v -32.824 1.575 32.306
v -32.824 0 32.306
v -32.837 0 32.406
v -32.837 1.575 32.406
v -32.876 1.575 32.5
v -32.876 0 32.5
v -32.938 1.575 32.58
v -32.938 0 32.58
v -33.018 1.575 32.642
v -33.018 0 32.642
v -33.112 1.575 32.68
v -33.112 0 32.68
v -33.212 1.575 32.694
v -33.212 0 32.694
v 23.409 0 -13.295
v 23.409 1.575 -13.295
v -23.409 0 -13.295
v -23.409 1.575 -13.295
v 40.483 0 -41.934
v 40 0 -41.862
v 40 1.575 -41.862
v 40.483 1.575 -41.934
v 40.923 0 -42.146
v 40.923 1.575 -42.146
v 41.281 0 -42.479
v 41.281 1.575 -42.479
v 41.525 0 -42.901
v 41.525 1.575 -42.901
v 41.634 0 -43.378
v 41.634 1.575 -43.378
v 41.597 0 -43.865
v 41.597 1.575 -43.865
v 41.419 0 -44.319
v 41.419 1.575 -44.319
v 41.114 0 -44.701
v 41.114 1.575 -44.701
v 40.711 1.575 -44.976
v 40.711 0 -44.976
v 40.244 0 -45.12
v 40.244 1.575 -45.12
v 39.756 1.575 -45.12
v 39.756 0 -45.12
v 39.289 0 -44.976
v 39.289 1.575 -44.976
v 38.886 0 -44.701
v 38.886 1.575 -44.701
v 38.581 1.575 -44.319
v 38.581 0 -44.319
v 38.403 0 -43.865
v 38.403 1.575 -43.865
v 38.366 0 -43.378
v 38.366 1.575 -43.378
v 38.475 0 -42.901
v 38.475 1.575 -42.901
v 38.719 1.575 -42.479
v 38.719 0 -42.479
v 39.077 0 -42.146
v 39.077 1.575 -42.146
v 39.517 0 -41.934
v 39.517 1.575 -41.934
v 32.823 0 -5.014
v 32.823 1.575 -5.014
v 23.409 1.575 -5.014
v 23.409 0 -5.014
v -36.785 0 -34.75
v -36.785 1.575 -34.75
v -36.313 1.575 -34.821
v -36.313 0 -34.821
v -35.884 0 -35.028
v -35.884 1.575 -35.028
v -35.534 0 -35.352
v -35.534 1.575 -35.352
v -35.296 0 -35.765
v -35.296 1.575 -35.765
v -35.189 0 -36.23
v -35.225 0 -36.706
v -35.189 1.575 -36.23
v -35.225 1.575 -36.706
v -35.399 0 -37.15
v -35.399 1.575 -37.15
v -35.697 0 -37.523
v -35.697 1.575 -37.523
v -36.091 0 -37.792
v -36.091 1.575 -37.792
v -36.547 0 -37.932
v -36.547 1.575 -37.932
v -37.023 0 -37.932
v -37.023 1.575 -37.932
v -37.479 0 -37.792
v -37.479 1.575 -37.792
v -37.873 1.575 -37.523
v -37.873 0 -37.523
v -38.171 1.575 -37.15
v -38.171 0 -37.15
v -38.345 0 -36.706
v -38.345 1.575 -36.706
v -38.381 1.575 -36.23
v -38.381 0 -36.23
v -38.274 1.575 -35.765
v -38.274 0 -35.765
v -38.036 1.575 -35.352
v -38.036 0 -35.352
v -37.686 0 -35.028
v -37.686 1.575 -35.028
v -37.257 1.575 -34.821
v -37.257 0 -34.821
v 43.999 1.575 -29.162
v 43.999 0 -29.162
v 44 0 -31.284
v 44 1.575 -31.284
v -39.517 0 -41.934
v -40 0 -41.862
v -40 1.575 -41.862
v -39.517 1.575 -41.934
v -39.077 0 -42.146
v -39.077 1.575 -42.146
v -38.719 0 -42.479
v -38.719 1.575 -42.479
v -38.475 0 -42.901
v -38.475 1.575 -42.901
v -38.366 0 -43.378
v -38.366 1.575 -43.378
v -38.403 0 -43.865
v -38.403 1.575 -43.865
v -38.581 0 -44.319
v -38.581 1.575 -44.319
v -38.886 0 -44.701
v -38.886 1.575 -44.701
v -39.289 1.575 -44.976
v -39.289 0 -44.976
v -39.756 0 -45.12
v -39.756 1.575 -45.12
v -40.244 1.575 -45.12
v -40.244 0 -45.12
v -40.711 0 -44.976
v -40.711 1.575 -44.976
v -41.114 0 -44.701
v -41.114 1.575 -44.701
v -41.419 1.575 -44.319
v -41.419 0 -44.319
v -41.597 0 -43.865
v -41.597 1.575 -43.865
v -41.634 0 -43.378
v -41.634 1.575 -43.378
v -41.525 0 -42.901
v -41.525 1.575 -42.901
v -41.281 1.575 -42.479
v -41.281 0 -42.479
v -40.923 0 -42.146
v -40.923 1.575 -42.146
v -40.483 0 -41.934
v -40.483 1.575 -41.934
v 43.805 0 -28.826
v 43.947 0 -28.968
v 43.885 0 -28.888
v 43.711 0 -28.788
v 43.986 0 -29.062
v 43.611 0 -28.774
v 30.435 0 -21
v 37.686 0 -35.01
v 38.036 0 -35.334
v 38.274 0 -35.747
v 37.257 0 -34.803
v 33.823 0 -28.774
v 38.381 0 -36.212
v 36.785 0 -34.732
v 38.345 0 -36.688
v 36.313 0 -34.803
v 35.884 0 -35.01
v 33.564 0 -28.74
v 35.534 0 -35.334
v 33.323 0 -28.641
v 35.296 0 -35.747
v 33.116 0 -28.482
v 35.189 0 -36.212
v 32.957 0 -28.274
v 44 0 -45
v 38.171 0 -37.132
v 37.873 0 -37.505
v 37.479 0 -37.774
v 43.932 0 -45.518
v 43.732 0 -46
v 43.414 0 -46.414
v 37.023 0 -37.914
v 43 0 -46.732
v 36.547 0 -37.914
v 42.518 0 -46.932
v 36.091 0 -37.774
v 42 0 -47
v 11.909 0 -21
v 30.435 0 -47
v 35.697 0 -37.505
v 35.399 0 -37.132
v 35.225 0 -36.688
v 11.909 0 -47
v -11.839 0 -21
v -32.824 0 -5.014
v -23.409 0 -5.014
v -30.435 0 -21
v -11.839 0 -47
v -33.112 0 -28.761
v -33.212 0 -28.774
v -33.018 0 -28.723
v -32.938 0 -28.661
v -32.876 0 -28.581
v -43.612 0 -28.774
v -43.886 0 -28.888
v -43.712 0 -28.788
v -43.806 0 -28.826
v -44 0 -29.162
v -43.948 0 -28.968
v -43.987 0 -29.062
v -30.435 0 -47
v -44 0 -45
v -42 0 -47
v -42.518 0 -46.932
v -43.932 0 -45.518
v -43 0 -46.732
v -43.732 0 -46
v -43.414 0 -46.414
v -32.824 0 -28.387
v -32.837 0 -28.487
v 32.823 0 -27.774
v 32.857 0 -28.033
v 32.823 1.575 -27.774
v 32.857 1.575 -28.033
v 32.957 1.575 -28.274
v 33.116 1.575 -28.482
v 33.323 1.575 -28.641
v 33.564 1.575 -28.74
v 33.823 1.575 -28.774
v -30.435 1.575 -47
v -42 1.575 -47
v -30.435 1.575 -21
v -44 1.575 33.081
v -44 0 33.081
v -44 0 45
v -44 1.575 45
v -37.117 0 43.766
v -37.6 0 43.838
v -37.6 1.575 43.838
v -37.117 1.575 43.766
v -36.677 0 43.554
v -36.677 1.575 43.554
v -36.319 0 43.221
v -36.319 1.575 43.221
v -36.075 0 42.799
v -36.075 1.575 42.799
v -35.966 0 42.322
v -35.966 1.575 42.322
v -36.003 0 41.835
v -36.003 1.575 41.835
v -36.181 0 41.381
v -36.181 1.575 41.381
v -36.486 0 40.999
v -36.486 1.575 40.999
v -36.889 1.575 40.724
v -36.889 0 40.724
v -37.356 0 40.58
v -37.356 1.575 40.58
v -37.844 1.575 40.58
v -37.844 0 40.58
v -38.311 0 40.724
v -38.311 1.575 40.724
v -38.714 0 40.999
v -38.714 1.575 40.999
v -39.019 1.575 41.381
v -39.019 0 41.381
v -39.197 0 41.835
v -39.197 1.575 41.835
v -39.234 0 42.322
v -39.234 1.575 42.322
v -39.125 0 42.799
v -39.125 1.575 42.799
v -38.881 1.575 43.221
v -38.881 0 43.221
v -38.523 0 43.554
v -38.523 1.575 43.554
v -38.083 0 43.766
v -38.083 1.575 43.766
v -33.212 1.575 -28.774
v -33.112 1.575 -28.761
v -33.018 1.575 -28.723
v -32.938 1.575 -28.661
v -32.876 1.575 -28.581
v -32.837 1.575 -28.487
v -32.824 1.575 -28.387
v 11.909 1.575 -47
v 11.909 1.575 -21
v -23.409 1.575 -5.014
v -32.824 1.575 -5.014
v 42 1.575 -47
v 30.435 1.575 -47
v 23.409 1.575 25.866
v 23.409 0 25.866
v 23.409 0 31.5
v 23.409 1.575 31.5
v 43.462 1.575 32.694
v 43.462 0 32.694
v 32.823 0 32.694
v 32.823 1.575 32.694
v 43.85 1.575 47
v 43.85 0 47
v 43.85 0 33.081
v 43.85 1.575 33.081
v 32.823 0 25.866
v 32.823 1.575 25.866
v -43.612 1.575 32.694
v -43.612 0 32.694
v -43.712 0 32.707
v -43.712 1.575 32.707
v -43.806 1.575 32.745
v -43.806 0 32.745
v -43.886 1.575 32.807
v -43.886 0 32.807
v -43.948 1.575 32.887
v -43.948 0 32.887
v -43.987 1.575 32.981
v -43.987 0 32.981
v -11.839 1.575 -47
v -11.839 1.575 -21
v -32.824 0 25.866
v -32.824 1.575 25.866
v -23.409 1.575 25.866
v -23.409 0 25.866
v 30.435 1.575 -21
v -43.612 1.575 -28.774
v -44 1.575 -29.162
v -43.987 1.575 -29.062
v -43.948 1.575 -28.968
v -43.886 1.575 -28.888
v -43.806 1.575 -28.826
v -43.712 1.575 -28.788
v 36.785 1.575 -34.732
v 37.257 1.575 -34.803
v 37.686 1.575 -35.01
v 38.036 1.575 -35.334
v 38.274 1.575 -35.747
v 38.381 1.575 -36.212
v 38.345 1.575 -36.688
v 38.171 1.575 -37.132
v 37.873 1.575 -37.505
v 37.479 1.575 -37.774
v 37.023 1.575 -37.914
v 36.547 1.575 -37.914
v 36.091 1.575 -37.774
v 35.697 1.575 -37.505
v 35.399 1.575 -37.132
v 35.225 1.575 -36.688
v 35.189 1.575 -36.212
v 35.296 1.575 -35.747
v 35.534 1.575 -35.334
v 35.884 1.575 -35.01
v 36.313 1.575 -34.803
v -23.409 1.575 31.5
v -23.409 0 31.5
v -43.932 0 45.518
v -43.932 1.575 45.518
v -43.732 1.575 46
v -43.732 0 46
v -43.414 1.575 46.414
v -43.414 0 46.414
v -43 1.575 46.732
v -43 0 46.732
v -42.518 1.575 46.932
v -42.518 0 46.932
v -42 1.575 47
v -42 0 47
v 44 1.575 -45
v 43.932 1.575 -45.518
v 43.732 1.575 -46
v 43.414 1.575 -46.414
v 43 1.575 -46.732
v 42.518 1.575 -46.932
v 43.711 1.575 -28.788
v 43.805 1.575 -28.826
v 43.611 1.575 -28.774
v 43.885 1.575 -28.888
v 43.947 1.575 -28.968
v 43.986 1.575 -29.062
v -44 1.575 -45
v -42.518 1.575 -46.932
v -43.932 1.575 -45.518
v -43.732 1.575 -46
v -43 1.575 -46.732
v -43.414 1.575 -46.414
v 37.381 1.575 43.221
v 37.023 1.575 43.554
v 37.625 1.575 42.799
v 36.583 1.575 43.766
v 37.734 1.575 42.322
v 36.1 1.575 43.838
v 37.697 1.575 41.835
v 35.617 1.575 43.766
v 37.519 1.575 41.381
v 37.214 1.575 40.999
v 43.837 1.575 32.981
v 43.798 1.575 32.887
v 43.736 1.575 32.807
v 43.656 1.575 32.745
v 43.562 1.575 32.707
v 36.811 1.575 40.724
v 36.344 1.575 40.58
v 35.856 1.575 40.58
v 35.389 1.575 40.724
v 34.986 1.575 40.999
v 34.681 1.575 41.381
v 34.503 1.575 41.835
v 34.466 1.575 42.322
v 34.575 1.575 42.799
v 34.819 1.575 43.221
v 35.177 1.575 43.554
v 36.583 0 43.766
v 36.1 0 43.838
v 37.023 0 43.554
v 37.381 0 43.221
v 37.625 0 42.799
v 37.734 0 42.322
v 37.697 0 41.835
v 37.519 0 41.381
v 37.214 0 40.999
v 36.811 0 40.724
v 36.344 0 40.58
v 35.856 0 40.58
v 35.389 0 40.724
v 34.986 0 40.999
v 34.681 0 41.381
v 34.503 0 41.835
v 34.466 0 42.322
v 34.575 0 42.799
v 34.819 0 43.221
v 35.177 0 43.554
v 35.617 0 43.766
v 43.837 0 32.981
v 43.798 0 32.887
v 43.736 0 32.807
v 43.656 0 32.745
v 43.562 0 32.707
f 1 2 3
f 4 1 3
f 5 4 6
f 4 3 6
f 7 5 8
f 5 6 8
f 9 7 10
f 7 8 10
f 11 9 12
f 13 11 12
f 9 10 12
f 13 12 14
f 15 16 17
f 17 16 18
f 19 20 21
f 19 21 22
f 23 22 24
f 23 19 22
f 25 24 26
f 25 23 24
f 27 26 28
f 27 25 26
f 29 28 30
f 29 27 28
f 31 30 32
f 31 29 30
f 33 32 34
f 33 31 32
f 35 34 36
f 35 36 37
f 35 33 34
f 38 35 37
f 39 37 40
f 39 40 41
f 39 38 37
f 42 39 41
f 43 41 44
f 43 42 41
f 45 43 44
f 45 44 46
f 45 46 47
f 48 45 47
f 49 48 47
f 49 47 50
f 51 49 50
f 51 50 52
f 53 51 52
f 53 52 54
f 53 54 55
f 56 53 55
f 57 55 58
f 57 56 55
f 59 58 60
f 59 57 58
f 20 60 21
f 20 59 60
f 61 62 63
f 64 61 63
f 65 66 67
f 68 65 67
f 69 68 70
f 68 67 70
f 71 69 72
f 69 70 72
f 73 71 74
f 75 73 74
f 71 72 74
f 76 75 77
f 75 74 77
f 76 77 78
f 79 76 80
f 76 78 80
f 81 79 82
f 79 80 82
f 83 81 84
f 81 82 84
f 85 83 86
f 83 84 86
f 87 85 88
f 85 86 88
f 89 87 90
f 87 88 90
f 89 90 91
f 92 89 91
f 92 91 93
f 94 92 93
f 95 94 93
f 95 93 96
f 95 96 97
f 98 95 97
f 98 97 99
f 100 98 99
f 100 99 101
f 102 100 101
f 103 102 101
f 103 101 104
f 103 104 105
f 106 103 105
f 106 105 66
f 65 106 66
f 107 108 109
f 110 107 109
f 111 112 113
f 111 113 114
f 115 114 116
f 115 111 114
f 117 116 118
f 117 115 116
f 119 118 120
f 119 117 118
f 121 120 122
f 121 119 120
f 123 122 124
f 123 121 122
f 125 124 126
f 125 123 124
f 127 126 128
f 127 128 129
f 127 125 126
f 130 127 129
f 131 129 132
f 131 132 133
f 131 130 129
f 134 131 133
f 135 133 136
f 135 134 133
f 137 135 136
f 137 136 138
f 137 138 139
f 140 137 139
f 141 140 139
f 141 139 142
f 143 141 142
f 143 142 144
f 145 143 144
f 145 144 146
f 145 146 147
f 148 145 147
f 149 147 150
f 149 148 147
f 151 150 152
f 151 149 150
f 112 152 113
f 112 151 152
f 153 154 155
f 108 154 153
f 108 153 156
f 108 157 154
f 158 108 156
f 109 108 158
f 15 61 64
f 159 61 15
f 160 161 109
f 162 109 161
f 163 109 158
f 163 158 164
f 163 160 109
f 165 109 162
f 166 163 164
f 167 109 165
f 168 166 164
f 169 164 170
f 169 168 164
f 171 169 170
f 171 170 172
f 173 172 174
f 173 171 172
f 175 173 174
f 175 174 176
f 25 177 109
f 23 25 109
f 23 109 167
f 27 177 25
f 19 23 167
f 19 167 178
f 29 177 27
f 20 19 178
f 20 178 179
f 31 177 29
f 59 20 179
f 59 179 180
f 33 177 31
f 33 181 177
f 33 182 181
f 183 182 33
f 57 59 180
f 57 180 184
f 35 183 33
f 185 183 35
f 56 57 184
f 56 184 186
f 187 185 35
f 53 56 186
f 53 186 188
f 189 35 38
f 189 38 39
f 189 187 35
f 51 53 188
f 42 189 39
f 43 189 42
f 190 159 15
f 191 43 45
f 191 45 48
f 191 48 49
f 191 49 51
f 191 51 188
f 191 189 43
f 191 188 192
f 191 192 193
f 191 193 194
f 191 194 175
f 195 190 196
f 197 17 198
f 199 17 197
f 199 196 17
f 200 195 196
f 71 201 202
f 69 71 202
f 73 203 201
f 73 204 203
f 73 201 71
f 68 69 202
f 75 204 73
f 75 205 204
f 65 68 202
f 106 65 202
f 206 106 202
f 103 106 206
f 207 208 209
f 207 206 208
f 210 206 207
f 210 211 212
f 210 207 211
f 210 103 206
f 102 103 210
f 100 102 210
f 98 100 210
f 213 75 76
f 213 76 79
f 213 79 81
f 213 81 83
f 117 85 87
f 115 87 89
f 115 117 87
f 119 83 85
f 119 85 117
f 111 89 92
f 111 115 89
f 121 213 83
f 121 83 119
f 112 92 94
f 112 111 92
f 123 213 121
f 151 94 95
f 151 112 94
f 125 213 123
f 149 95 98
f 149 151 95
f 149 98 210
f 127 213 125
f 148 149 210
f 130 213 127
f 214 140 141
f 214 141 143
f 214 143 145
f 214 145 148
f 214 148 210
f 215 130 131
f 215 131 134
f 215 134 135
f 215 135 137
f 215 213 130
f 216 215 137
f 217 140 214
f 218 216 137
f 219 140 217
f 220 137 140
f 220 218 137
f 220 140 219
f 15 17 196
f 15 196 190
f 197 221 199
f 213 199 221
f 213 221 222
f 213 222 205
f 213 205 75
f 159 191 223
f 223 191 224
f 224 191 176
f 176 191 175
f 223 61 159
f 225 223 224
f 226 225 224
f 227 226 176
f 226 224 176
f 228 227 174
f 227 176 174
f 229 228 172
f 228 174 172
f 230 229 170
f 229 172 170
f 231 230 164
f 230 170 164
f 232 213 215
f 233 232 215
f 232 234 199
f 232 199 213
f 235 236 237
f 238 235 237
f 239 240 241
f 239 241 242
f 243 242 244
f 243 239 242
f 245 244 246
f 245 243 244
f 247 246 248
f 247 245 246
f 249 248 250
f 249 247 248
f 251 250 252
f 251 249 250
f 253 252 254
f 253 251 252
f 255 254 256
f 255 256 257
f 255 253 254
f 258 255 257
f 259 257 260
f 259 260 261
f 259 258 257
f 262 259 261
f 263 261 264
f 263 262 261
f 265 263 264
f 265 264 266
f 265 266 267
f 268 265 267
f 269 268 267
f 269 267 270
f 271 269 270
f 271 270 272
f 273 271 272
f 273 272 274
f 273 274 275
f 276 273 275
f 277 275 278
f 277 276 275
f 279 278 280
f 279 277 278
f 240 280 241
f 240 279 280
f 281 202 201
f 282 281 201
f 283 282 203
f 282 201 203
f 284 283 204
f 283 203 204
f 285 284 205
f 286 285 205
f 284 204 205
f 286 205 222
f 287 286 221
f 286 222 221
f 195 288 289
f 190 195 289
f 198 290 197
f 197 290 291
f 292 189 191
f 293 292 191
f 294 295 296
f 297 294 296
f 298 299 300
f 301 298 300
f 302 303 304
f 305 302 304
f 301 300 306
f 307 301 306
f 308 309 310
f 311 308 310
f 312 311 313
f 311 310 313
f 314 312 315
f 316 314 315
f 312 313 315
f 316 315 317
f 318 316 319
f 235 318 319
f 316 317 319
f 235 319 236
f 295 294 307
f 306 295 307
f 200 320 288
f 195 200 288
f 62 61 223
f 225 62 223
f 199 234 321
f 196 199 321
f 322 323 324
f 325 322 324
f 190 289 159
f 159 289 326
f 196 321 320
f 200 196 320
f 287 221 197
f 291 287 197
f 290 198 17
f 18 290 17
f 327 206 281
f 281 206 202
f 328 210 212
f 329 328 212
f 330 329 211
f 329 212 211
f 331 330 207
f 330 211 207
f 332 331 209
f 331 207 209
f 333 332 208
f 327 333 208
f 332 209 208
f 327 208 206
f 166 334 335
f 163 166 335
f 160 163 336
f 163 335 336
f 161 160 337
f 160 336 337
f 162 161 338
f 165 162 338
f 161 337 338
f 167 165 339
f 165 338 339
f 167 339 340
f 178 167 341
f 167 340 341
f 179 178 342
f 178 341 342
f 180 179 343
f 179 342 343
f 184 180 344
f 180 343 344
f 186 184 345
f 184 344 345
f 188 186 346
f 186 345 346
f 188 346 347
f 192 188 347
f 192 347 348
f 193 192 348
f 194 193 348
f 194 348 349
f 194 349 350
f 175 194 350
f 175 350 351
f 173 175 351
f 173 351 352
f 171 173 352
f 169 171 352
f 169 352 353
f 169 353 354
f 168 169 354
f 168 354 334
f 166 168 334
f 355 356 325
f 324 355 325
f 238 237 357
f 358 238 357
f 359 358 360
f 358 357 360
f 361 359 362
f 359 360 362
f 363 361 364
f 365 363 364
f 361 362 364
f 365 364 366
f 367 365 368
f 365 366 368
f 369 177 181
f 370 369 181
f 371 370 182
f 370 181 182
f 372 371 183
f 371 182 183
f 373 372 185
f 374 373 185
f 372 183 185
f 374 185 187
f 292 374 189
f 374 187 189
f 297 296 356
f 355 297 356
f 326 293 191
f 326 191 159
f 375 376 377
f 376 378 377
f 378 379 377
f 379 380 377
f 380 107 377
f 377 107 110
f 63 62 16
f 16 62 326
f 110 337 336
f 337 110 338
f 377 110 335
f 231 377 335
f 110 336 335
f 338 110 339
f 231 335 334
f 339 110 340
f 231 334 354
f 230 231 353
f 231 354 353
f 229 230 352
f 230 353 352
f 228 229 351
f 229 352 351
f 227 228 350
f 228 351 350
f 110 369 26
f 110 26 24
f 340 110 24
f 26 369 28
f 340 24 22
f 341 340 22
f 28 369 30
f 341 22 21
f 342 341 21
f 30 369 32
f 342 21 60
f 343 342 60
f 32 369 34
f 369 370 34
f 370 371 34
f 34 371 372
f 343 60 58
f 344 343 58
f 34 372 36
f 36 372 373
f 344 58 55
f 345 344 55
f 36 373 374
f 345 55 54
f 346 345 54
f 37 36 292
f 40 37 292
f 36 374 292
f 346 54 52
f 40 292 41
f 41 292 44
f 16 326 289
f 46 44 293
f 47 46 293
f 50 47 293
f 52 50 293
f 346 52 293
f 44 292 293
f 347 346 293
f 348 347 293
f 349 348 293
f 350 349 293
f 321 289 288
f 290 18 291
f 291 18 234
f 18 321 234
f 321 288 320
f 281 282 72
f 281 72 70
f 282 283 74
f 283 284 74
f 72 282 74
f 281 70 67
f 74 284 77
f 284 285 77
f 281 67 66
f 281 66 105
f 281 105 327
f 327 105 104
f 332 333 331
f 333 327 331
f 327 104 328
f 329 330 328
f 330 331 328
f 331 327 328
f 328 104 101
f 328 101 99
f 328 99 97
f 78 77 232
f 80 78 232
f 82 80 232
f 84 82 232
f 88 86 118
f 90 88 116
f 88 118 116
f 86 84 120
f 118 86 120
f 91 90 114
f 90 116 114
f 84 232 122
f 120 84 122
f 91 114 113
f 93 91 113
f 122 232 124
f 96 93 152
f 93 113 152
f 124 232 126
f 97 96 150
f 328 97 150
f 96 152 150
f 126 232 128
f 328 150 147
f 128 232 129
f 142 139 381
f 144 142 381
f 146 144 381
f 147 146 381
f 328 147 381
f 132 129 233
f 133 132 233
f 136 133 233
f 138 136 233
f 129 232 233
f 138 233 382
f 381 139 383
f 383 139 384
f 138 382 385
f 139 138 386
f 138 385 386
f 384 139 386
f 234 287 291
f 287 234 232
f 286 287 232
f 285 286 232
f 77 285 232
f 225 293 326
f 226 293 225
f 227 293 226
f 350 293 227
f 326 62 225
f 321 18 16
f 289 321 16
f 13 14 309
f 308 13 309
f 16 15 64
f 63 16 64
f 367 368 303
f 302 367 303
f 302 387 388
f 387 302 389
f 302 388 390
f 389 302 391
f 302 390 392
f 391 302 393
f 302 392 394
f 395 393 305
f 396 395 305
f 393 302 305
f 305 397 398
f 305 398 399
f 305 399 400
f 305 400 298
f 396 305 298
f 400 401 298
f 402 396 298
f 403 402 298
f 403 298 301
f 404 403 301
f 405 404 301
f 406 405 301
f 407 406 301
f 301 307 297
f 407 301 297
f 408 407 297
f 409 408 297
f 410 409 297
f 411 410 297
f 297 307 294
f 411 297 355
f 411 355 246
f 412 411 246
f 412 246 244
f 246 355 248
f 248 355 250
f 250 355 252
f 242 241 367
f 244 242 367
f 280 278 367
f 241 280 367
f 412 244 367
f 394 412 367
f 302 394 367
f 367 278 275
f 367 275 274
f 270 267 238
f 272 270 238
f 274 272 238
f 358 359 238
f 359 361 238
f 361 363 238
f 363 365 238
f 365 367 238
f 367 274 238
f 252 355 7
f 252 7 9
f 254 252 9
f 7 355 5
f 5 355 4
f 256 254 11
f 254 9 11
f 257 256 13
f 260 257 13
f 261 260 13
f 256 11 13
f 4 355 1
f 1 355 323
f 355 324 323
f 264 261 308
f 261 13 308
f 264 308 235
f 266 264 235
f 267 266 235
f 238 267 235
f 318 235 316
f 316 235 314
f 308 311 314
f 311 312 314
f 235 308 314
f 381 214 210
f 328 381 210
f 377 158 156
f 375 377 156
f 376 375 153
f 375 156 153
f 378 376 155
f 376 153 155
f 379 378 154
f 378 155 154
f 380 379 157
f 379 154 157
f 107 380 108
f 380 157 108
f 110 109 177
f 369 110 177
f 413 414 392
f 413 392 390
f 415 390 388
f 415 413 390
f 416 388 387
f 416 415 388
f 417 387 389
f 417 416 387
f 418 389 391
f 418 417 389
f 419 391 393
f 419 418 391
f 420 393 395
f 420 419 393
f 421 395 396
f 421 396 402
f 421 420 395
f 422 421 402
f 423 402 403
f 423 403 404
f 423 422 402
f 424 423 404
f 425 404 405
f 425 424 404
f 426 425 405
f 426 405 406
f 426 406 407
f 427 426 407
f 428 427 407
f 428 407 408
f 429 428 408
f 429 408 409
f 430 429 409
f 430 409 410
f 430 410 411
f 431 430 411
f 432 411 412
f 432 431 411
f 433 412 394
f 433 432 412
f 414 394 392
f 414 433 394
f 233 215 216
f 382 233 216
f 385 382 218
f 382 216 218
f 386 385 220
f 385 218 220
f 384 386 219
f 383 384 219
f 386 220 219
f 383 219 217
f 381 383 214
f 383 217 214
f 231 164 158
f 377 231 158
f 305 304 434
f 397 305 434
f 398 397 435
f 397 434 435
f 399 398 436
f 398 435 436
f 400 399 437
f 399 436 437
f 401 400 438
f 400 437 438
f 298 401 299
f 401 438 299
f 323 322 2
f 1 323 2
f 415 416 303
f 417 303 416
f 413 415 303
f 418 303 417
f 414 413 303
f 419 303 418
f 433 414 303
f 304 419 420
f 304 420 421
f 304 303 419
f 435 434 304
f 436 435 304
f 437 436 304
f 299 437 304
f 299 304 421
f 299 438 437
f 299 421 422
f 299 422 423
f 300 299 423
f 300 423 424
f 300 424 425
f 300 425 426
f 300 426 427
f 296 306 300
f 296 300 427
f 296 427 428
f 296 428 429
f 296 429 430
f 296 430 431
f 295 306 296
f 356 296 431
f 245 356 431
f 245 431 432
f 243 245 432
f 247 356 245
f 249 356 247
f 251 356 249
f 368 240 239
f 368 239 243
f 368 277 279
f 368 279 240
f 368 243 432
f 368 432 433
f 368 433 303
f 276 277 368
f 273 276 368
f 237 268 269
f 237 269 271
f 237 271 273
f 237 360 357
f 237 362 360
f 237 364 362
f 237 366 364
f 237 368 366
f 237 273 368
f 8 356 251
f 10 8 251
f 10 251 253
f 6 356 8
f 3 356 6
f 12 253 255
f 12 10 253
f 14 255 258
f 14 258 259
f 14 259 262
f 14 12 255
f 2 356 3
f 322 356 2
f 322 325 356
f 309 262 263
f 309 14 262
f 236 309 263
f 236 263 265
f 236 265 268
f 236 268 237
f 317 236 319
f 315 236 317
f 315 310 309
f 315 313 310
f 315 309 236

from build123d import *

# Parameters (mm, degrees)
SKETCH1_R           = 1.6383
BOSS_EXTRUDE1_DEPTH = 1.575
CUT_EXTRUDE1_DEPTH  = 2.54
SKETCH15_R          = 1.6
CUT_EXTRUDE5_DEPTH  = 65.400936523
BOSS_EXTRUDE2_DEPTH = 1.575
CUT_EXTRUDE7_DEPTH  = 65.400936523
SKETCH21_W          = 65.646785141
SKETCH21_H          = 2.674
CUT_EXTRUDE10_DEPTH = 65.400936523


with BuildPart() as part:
    # Sketch1 → Boss-Extrude1 (new body)
    with BuildSketch(Plane(origin=(0, 0, 0), x_dir=(1, 0, 0), z_dir=(0, 1, 0))):
        with BuildLine():
            Line((-44, 45), (-44, 29.162404323))
            ThreePointArc((-44, 29.162404323), (-43.886381258, 28.888104416), (-43.612081351, 28.774485674))
            Line((-43.612081351, 28.774485674), (-33.211918649, 28.774485674))
            ThreePointArc((-33.211918649, 28.774485674), (-32.937618742, 28.660866933), (-32.824, 28.386567026))
            Line((-32.824, 28.386567026), (-32.824, -32.305595677))
            ThreePointArc((-32.824, -32.305595677), (-32.937618742, -32.579895584), (-33.211918649, -32.693514326))
            Line((-33.211918649, -32.693514326), (-36.100000052, -32.693514326))
            Line((-36.100000052, -32.693514326), (-43.612081299, -32.693514326))
            ThreePointArc((-43.612081299, -32.693514326), (-43.886381206, -32.807133067), (-43.999999948, -33.081432974))
            Line((-43.999999948, -33.081432974), (-43.999999948, -38.977))
            Line((-43.999999948, -38.977), (-43.999999948, -45))
            ThreePointArc((-43.999999948, -45), (-43.41421351, -46.414213562), (-41.999999948, -47))
            Line((-41.999999948, -47), (42.705916546, -47))
            Line((42.705916546, -47), (43.849731117, -47))
            Line((43.849731117, -47), (43.849731117, -38.27))
            Line((43.849731117, -38.27), (43.849731117, -33.081432974))
            ThreePointArc((43.849731117, -33.081432974), (43.736112376, -32.807133067), (43.461812469, -32.693514326))
            Line((43.461812469, -32.693514326), (36.098785193, -32.693514326))
            Line((36.098785193, -32.693514326), (33.824, -32.693514326))
            Line((33.824, -32.693514326), (32.822785141, -32.693514326))
            Line((32.822785141, -32.693514326), (32.822785141, -30.469351623))
            Line((32.822785141, -30.469351623), (32.822785141, 27.774485674))
            ThreePointArc((32.822785141, 27.774485674), (33.11567836, 28.481592456), (33.822785141, 28.774485674))
            Line((33.822785141, 28.774485674), (43.611054239, 28.774485674))
            ThreePointArc((43.611054239, 28.774485674), (43.885287743, 28.88803803), (43.998972842, 29.162216531))
            Line((43.998972842, 29.162216531), (44, 31.284))
            Line((44, 31.284), (44, 45))
            ThreePointArc((44, 45), (43.414213562, 46.414213562), (42, 47))
            Line((42, 47), (-42, 47))
            ThreePointArc((-42, 47), (-43.414213562, 46.414213562), (-44, 45))
        make_face()
        with Locations(Location((40, 43.5, 0), (0, 0, 270))):
            Circle(SKETCH1_R, mode=Mode.SUBTRACT)
        with Locations(Location((-40, 43.5, 0), (0, 0, 270))):
            Circle(SKETCH1_R, mode=Mode.SUBTRACT)
        with Locations(Location((-37.599999948, -42.2, 0), (0, 0, 270))):
            Circle(SKETCH1_R, mode=Mode.SUBTRACT)
        with Locations(Location((36.100000052, -42.2, 0), (0, 0, 270))):
            Circle(SKETCH1_R, mode=Mode.SUBTRACT)
        Polygon((23.409, -31.5), (-23.409, -31.5), (-23.409, 13.29544), (-12.909, 13.29544), (-12.909, 25.99544), (12.909, 25.99544), (12.909, 13.29544), (23.409, 13.29544), align=None, mode=Mode.SUBTRACT)
    extrude(amount=BOSS_EXTRUDE1_DEPTH)

    # Sketch2 → Cut-Extrude1 (cut)
    with BuildSketch(Plane(origin=(0, 1.575, 0), x_dir=(1, 0, 0), z_dir=(0, 1, 0))):
        Polygon((-12.909, 19.06), (-30.435, 19.06), (-30.435, 47), (30.435, 47), (30.435, 19.06), (12.909, 19.06), (12.909, 25.99544), (-12.909, 25.99544), align=None)
    extrude(amount=-CUT_EXTRUDE1_DEPTH, mode=Mode.SUBTRACT)

    # Sketch15 → Cut-Extrude5 (cut, through all)
    with BuildSketch(Plane(origin=(0, 1.575, 0), x_dir=(1, 0, 0), z_dir=(0, 1, 0))):
        with Locations(Location((-36.785, 36.35, 0), (0, 0, 270))):
            Circle(SKETCH15_R)
        with Locations(Location((36.785, 36.332, 0), (0, 0, 270))):
            Circle(SKETCH15_R)
    extrude(amount=-CUT_EXTRUDE5_DEPTH, mode=Mode.SUBTRACT)

    # Sketch16 → Boss-Extrude2 (add)
    with BuildSketch(Plane(origin=(0, 1.575, 0), x_dir=(1, 0, 0), z_dir=(0, 1, 0))):
        Polygon((12.909, 19.06), (12.909, 13.29544), (-12.909, 13.29544), (-12.909, 19.06), (-30.435, 19.06), (-30.435, 21), (-11.838888217, 21), (-11.838888217, 47), (11.909, 47), (11.909, 21), (30.435, 21), (30.435, 19.06), align=None)
    extrude(amount=-BOSS_EXTRUDE2_DEPTH)

    # Sketch17 → Cut-Extrude7 (cut, through all)
    with BuildSketch(Plane(origin=(0, 1.575, 0), x_dir=(1, 0, 0), z_dir=(0, 1, 0))):
        Polygon((-42.620402532, -10.524407413), (-42.620402532, -23.19180025), (43.180071614, -23.19180025), (43.180071614, -10.524407413), (43.180071614, 5.014261133), (-42.620402532, 5.014261133), align=None)
    extrude(amount=-CUT_EXTRUDE7_DEPTH, mode=Mode.SUBTRACT)


with BuildPart() as cut_extrude7_piece_1:
    # of the separate pieces the step leaves, piece 1, a body of its own (cut_extrude7_pieces)
    add(part.part.solids().sort_by_distance((-44, 0, -45))[0])


with BuildPart() as cut_extrude7_piece_2:
    # of the separate pieces the step leaves, piece 2, a body of its own (cut_extrude7_pieces)
    add(part.part.solids().sort_by_distance((-32.824, 0, 23.19180025))[0])

    # Sketch21 → Cut-Extrude10 (cut, through all)
    with BuildSketch(Plane(origin=(0, 1.575, 0), x_dir=(1, 0, 0), z_dir=(0, 1, 0))):
        with Locations((-0.00060743, -24.52880025)):
            Rectangle(SKETCH21_W, SKETCH21_H)
    extrude(amount=-CUT_EXTRUDE10_DEPTH, mode=Mode.SUBTRACT)


solid = Compound([cut_extrude7_piece_1.part, cut_extrude7_piece_2.part])
